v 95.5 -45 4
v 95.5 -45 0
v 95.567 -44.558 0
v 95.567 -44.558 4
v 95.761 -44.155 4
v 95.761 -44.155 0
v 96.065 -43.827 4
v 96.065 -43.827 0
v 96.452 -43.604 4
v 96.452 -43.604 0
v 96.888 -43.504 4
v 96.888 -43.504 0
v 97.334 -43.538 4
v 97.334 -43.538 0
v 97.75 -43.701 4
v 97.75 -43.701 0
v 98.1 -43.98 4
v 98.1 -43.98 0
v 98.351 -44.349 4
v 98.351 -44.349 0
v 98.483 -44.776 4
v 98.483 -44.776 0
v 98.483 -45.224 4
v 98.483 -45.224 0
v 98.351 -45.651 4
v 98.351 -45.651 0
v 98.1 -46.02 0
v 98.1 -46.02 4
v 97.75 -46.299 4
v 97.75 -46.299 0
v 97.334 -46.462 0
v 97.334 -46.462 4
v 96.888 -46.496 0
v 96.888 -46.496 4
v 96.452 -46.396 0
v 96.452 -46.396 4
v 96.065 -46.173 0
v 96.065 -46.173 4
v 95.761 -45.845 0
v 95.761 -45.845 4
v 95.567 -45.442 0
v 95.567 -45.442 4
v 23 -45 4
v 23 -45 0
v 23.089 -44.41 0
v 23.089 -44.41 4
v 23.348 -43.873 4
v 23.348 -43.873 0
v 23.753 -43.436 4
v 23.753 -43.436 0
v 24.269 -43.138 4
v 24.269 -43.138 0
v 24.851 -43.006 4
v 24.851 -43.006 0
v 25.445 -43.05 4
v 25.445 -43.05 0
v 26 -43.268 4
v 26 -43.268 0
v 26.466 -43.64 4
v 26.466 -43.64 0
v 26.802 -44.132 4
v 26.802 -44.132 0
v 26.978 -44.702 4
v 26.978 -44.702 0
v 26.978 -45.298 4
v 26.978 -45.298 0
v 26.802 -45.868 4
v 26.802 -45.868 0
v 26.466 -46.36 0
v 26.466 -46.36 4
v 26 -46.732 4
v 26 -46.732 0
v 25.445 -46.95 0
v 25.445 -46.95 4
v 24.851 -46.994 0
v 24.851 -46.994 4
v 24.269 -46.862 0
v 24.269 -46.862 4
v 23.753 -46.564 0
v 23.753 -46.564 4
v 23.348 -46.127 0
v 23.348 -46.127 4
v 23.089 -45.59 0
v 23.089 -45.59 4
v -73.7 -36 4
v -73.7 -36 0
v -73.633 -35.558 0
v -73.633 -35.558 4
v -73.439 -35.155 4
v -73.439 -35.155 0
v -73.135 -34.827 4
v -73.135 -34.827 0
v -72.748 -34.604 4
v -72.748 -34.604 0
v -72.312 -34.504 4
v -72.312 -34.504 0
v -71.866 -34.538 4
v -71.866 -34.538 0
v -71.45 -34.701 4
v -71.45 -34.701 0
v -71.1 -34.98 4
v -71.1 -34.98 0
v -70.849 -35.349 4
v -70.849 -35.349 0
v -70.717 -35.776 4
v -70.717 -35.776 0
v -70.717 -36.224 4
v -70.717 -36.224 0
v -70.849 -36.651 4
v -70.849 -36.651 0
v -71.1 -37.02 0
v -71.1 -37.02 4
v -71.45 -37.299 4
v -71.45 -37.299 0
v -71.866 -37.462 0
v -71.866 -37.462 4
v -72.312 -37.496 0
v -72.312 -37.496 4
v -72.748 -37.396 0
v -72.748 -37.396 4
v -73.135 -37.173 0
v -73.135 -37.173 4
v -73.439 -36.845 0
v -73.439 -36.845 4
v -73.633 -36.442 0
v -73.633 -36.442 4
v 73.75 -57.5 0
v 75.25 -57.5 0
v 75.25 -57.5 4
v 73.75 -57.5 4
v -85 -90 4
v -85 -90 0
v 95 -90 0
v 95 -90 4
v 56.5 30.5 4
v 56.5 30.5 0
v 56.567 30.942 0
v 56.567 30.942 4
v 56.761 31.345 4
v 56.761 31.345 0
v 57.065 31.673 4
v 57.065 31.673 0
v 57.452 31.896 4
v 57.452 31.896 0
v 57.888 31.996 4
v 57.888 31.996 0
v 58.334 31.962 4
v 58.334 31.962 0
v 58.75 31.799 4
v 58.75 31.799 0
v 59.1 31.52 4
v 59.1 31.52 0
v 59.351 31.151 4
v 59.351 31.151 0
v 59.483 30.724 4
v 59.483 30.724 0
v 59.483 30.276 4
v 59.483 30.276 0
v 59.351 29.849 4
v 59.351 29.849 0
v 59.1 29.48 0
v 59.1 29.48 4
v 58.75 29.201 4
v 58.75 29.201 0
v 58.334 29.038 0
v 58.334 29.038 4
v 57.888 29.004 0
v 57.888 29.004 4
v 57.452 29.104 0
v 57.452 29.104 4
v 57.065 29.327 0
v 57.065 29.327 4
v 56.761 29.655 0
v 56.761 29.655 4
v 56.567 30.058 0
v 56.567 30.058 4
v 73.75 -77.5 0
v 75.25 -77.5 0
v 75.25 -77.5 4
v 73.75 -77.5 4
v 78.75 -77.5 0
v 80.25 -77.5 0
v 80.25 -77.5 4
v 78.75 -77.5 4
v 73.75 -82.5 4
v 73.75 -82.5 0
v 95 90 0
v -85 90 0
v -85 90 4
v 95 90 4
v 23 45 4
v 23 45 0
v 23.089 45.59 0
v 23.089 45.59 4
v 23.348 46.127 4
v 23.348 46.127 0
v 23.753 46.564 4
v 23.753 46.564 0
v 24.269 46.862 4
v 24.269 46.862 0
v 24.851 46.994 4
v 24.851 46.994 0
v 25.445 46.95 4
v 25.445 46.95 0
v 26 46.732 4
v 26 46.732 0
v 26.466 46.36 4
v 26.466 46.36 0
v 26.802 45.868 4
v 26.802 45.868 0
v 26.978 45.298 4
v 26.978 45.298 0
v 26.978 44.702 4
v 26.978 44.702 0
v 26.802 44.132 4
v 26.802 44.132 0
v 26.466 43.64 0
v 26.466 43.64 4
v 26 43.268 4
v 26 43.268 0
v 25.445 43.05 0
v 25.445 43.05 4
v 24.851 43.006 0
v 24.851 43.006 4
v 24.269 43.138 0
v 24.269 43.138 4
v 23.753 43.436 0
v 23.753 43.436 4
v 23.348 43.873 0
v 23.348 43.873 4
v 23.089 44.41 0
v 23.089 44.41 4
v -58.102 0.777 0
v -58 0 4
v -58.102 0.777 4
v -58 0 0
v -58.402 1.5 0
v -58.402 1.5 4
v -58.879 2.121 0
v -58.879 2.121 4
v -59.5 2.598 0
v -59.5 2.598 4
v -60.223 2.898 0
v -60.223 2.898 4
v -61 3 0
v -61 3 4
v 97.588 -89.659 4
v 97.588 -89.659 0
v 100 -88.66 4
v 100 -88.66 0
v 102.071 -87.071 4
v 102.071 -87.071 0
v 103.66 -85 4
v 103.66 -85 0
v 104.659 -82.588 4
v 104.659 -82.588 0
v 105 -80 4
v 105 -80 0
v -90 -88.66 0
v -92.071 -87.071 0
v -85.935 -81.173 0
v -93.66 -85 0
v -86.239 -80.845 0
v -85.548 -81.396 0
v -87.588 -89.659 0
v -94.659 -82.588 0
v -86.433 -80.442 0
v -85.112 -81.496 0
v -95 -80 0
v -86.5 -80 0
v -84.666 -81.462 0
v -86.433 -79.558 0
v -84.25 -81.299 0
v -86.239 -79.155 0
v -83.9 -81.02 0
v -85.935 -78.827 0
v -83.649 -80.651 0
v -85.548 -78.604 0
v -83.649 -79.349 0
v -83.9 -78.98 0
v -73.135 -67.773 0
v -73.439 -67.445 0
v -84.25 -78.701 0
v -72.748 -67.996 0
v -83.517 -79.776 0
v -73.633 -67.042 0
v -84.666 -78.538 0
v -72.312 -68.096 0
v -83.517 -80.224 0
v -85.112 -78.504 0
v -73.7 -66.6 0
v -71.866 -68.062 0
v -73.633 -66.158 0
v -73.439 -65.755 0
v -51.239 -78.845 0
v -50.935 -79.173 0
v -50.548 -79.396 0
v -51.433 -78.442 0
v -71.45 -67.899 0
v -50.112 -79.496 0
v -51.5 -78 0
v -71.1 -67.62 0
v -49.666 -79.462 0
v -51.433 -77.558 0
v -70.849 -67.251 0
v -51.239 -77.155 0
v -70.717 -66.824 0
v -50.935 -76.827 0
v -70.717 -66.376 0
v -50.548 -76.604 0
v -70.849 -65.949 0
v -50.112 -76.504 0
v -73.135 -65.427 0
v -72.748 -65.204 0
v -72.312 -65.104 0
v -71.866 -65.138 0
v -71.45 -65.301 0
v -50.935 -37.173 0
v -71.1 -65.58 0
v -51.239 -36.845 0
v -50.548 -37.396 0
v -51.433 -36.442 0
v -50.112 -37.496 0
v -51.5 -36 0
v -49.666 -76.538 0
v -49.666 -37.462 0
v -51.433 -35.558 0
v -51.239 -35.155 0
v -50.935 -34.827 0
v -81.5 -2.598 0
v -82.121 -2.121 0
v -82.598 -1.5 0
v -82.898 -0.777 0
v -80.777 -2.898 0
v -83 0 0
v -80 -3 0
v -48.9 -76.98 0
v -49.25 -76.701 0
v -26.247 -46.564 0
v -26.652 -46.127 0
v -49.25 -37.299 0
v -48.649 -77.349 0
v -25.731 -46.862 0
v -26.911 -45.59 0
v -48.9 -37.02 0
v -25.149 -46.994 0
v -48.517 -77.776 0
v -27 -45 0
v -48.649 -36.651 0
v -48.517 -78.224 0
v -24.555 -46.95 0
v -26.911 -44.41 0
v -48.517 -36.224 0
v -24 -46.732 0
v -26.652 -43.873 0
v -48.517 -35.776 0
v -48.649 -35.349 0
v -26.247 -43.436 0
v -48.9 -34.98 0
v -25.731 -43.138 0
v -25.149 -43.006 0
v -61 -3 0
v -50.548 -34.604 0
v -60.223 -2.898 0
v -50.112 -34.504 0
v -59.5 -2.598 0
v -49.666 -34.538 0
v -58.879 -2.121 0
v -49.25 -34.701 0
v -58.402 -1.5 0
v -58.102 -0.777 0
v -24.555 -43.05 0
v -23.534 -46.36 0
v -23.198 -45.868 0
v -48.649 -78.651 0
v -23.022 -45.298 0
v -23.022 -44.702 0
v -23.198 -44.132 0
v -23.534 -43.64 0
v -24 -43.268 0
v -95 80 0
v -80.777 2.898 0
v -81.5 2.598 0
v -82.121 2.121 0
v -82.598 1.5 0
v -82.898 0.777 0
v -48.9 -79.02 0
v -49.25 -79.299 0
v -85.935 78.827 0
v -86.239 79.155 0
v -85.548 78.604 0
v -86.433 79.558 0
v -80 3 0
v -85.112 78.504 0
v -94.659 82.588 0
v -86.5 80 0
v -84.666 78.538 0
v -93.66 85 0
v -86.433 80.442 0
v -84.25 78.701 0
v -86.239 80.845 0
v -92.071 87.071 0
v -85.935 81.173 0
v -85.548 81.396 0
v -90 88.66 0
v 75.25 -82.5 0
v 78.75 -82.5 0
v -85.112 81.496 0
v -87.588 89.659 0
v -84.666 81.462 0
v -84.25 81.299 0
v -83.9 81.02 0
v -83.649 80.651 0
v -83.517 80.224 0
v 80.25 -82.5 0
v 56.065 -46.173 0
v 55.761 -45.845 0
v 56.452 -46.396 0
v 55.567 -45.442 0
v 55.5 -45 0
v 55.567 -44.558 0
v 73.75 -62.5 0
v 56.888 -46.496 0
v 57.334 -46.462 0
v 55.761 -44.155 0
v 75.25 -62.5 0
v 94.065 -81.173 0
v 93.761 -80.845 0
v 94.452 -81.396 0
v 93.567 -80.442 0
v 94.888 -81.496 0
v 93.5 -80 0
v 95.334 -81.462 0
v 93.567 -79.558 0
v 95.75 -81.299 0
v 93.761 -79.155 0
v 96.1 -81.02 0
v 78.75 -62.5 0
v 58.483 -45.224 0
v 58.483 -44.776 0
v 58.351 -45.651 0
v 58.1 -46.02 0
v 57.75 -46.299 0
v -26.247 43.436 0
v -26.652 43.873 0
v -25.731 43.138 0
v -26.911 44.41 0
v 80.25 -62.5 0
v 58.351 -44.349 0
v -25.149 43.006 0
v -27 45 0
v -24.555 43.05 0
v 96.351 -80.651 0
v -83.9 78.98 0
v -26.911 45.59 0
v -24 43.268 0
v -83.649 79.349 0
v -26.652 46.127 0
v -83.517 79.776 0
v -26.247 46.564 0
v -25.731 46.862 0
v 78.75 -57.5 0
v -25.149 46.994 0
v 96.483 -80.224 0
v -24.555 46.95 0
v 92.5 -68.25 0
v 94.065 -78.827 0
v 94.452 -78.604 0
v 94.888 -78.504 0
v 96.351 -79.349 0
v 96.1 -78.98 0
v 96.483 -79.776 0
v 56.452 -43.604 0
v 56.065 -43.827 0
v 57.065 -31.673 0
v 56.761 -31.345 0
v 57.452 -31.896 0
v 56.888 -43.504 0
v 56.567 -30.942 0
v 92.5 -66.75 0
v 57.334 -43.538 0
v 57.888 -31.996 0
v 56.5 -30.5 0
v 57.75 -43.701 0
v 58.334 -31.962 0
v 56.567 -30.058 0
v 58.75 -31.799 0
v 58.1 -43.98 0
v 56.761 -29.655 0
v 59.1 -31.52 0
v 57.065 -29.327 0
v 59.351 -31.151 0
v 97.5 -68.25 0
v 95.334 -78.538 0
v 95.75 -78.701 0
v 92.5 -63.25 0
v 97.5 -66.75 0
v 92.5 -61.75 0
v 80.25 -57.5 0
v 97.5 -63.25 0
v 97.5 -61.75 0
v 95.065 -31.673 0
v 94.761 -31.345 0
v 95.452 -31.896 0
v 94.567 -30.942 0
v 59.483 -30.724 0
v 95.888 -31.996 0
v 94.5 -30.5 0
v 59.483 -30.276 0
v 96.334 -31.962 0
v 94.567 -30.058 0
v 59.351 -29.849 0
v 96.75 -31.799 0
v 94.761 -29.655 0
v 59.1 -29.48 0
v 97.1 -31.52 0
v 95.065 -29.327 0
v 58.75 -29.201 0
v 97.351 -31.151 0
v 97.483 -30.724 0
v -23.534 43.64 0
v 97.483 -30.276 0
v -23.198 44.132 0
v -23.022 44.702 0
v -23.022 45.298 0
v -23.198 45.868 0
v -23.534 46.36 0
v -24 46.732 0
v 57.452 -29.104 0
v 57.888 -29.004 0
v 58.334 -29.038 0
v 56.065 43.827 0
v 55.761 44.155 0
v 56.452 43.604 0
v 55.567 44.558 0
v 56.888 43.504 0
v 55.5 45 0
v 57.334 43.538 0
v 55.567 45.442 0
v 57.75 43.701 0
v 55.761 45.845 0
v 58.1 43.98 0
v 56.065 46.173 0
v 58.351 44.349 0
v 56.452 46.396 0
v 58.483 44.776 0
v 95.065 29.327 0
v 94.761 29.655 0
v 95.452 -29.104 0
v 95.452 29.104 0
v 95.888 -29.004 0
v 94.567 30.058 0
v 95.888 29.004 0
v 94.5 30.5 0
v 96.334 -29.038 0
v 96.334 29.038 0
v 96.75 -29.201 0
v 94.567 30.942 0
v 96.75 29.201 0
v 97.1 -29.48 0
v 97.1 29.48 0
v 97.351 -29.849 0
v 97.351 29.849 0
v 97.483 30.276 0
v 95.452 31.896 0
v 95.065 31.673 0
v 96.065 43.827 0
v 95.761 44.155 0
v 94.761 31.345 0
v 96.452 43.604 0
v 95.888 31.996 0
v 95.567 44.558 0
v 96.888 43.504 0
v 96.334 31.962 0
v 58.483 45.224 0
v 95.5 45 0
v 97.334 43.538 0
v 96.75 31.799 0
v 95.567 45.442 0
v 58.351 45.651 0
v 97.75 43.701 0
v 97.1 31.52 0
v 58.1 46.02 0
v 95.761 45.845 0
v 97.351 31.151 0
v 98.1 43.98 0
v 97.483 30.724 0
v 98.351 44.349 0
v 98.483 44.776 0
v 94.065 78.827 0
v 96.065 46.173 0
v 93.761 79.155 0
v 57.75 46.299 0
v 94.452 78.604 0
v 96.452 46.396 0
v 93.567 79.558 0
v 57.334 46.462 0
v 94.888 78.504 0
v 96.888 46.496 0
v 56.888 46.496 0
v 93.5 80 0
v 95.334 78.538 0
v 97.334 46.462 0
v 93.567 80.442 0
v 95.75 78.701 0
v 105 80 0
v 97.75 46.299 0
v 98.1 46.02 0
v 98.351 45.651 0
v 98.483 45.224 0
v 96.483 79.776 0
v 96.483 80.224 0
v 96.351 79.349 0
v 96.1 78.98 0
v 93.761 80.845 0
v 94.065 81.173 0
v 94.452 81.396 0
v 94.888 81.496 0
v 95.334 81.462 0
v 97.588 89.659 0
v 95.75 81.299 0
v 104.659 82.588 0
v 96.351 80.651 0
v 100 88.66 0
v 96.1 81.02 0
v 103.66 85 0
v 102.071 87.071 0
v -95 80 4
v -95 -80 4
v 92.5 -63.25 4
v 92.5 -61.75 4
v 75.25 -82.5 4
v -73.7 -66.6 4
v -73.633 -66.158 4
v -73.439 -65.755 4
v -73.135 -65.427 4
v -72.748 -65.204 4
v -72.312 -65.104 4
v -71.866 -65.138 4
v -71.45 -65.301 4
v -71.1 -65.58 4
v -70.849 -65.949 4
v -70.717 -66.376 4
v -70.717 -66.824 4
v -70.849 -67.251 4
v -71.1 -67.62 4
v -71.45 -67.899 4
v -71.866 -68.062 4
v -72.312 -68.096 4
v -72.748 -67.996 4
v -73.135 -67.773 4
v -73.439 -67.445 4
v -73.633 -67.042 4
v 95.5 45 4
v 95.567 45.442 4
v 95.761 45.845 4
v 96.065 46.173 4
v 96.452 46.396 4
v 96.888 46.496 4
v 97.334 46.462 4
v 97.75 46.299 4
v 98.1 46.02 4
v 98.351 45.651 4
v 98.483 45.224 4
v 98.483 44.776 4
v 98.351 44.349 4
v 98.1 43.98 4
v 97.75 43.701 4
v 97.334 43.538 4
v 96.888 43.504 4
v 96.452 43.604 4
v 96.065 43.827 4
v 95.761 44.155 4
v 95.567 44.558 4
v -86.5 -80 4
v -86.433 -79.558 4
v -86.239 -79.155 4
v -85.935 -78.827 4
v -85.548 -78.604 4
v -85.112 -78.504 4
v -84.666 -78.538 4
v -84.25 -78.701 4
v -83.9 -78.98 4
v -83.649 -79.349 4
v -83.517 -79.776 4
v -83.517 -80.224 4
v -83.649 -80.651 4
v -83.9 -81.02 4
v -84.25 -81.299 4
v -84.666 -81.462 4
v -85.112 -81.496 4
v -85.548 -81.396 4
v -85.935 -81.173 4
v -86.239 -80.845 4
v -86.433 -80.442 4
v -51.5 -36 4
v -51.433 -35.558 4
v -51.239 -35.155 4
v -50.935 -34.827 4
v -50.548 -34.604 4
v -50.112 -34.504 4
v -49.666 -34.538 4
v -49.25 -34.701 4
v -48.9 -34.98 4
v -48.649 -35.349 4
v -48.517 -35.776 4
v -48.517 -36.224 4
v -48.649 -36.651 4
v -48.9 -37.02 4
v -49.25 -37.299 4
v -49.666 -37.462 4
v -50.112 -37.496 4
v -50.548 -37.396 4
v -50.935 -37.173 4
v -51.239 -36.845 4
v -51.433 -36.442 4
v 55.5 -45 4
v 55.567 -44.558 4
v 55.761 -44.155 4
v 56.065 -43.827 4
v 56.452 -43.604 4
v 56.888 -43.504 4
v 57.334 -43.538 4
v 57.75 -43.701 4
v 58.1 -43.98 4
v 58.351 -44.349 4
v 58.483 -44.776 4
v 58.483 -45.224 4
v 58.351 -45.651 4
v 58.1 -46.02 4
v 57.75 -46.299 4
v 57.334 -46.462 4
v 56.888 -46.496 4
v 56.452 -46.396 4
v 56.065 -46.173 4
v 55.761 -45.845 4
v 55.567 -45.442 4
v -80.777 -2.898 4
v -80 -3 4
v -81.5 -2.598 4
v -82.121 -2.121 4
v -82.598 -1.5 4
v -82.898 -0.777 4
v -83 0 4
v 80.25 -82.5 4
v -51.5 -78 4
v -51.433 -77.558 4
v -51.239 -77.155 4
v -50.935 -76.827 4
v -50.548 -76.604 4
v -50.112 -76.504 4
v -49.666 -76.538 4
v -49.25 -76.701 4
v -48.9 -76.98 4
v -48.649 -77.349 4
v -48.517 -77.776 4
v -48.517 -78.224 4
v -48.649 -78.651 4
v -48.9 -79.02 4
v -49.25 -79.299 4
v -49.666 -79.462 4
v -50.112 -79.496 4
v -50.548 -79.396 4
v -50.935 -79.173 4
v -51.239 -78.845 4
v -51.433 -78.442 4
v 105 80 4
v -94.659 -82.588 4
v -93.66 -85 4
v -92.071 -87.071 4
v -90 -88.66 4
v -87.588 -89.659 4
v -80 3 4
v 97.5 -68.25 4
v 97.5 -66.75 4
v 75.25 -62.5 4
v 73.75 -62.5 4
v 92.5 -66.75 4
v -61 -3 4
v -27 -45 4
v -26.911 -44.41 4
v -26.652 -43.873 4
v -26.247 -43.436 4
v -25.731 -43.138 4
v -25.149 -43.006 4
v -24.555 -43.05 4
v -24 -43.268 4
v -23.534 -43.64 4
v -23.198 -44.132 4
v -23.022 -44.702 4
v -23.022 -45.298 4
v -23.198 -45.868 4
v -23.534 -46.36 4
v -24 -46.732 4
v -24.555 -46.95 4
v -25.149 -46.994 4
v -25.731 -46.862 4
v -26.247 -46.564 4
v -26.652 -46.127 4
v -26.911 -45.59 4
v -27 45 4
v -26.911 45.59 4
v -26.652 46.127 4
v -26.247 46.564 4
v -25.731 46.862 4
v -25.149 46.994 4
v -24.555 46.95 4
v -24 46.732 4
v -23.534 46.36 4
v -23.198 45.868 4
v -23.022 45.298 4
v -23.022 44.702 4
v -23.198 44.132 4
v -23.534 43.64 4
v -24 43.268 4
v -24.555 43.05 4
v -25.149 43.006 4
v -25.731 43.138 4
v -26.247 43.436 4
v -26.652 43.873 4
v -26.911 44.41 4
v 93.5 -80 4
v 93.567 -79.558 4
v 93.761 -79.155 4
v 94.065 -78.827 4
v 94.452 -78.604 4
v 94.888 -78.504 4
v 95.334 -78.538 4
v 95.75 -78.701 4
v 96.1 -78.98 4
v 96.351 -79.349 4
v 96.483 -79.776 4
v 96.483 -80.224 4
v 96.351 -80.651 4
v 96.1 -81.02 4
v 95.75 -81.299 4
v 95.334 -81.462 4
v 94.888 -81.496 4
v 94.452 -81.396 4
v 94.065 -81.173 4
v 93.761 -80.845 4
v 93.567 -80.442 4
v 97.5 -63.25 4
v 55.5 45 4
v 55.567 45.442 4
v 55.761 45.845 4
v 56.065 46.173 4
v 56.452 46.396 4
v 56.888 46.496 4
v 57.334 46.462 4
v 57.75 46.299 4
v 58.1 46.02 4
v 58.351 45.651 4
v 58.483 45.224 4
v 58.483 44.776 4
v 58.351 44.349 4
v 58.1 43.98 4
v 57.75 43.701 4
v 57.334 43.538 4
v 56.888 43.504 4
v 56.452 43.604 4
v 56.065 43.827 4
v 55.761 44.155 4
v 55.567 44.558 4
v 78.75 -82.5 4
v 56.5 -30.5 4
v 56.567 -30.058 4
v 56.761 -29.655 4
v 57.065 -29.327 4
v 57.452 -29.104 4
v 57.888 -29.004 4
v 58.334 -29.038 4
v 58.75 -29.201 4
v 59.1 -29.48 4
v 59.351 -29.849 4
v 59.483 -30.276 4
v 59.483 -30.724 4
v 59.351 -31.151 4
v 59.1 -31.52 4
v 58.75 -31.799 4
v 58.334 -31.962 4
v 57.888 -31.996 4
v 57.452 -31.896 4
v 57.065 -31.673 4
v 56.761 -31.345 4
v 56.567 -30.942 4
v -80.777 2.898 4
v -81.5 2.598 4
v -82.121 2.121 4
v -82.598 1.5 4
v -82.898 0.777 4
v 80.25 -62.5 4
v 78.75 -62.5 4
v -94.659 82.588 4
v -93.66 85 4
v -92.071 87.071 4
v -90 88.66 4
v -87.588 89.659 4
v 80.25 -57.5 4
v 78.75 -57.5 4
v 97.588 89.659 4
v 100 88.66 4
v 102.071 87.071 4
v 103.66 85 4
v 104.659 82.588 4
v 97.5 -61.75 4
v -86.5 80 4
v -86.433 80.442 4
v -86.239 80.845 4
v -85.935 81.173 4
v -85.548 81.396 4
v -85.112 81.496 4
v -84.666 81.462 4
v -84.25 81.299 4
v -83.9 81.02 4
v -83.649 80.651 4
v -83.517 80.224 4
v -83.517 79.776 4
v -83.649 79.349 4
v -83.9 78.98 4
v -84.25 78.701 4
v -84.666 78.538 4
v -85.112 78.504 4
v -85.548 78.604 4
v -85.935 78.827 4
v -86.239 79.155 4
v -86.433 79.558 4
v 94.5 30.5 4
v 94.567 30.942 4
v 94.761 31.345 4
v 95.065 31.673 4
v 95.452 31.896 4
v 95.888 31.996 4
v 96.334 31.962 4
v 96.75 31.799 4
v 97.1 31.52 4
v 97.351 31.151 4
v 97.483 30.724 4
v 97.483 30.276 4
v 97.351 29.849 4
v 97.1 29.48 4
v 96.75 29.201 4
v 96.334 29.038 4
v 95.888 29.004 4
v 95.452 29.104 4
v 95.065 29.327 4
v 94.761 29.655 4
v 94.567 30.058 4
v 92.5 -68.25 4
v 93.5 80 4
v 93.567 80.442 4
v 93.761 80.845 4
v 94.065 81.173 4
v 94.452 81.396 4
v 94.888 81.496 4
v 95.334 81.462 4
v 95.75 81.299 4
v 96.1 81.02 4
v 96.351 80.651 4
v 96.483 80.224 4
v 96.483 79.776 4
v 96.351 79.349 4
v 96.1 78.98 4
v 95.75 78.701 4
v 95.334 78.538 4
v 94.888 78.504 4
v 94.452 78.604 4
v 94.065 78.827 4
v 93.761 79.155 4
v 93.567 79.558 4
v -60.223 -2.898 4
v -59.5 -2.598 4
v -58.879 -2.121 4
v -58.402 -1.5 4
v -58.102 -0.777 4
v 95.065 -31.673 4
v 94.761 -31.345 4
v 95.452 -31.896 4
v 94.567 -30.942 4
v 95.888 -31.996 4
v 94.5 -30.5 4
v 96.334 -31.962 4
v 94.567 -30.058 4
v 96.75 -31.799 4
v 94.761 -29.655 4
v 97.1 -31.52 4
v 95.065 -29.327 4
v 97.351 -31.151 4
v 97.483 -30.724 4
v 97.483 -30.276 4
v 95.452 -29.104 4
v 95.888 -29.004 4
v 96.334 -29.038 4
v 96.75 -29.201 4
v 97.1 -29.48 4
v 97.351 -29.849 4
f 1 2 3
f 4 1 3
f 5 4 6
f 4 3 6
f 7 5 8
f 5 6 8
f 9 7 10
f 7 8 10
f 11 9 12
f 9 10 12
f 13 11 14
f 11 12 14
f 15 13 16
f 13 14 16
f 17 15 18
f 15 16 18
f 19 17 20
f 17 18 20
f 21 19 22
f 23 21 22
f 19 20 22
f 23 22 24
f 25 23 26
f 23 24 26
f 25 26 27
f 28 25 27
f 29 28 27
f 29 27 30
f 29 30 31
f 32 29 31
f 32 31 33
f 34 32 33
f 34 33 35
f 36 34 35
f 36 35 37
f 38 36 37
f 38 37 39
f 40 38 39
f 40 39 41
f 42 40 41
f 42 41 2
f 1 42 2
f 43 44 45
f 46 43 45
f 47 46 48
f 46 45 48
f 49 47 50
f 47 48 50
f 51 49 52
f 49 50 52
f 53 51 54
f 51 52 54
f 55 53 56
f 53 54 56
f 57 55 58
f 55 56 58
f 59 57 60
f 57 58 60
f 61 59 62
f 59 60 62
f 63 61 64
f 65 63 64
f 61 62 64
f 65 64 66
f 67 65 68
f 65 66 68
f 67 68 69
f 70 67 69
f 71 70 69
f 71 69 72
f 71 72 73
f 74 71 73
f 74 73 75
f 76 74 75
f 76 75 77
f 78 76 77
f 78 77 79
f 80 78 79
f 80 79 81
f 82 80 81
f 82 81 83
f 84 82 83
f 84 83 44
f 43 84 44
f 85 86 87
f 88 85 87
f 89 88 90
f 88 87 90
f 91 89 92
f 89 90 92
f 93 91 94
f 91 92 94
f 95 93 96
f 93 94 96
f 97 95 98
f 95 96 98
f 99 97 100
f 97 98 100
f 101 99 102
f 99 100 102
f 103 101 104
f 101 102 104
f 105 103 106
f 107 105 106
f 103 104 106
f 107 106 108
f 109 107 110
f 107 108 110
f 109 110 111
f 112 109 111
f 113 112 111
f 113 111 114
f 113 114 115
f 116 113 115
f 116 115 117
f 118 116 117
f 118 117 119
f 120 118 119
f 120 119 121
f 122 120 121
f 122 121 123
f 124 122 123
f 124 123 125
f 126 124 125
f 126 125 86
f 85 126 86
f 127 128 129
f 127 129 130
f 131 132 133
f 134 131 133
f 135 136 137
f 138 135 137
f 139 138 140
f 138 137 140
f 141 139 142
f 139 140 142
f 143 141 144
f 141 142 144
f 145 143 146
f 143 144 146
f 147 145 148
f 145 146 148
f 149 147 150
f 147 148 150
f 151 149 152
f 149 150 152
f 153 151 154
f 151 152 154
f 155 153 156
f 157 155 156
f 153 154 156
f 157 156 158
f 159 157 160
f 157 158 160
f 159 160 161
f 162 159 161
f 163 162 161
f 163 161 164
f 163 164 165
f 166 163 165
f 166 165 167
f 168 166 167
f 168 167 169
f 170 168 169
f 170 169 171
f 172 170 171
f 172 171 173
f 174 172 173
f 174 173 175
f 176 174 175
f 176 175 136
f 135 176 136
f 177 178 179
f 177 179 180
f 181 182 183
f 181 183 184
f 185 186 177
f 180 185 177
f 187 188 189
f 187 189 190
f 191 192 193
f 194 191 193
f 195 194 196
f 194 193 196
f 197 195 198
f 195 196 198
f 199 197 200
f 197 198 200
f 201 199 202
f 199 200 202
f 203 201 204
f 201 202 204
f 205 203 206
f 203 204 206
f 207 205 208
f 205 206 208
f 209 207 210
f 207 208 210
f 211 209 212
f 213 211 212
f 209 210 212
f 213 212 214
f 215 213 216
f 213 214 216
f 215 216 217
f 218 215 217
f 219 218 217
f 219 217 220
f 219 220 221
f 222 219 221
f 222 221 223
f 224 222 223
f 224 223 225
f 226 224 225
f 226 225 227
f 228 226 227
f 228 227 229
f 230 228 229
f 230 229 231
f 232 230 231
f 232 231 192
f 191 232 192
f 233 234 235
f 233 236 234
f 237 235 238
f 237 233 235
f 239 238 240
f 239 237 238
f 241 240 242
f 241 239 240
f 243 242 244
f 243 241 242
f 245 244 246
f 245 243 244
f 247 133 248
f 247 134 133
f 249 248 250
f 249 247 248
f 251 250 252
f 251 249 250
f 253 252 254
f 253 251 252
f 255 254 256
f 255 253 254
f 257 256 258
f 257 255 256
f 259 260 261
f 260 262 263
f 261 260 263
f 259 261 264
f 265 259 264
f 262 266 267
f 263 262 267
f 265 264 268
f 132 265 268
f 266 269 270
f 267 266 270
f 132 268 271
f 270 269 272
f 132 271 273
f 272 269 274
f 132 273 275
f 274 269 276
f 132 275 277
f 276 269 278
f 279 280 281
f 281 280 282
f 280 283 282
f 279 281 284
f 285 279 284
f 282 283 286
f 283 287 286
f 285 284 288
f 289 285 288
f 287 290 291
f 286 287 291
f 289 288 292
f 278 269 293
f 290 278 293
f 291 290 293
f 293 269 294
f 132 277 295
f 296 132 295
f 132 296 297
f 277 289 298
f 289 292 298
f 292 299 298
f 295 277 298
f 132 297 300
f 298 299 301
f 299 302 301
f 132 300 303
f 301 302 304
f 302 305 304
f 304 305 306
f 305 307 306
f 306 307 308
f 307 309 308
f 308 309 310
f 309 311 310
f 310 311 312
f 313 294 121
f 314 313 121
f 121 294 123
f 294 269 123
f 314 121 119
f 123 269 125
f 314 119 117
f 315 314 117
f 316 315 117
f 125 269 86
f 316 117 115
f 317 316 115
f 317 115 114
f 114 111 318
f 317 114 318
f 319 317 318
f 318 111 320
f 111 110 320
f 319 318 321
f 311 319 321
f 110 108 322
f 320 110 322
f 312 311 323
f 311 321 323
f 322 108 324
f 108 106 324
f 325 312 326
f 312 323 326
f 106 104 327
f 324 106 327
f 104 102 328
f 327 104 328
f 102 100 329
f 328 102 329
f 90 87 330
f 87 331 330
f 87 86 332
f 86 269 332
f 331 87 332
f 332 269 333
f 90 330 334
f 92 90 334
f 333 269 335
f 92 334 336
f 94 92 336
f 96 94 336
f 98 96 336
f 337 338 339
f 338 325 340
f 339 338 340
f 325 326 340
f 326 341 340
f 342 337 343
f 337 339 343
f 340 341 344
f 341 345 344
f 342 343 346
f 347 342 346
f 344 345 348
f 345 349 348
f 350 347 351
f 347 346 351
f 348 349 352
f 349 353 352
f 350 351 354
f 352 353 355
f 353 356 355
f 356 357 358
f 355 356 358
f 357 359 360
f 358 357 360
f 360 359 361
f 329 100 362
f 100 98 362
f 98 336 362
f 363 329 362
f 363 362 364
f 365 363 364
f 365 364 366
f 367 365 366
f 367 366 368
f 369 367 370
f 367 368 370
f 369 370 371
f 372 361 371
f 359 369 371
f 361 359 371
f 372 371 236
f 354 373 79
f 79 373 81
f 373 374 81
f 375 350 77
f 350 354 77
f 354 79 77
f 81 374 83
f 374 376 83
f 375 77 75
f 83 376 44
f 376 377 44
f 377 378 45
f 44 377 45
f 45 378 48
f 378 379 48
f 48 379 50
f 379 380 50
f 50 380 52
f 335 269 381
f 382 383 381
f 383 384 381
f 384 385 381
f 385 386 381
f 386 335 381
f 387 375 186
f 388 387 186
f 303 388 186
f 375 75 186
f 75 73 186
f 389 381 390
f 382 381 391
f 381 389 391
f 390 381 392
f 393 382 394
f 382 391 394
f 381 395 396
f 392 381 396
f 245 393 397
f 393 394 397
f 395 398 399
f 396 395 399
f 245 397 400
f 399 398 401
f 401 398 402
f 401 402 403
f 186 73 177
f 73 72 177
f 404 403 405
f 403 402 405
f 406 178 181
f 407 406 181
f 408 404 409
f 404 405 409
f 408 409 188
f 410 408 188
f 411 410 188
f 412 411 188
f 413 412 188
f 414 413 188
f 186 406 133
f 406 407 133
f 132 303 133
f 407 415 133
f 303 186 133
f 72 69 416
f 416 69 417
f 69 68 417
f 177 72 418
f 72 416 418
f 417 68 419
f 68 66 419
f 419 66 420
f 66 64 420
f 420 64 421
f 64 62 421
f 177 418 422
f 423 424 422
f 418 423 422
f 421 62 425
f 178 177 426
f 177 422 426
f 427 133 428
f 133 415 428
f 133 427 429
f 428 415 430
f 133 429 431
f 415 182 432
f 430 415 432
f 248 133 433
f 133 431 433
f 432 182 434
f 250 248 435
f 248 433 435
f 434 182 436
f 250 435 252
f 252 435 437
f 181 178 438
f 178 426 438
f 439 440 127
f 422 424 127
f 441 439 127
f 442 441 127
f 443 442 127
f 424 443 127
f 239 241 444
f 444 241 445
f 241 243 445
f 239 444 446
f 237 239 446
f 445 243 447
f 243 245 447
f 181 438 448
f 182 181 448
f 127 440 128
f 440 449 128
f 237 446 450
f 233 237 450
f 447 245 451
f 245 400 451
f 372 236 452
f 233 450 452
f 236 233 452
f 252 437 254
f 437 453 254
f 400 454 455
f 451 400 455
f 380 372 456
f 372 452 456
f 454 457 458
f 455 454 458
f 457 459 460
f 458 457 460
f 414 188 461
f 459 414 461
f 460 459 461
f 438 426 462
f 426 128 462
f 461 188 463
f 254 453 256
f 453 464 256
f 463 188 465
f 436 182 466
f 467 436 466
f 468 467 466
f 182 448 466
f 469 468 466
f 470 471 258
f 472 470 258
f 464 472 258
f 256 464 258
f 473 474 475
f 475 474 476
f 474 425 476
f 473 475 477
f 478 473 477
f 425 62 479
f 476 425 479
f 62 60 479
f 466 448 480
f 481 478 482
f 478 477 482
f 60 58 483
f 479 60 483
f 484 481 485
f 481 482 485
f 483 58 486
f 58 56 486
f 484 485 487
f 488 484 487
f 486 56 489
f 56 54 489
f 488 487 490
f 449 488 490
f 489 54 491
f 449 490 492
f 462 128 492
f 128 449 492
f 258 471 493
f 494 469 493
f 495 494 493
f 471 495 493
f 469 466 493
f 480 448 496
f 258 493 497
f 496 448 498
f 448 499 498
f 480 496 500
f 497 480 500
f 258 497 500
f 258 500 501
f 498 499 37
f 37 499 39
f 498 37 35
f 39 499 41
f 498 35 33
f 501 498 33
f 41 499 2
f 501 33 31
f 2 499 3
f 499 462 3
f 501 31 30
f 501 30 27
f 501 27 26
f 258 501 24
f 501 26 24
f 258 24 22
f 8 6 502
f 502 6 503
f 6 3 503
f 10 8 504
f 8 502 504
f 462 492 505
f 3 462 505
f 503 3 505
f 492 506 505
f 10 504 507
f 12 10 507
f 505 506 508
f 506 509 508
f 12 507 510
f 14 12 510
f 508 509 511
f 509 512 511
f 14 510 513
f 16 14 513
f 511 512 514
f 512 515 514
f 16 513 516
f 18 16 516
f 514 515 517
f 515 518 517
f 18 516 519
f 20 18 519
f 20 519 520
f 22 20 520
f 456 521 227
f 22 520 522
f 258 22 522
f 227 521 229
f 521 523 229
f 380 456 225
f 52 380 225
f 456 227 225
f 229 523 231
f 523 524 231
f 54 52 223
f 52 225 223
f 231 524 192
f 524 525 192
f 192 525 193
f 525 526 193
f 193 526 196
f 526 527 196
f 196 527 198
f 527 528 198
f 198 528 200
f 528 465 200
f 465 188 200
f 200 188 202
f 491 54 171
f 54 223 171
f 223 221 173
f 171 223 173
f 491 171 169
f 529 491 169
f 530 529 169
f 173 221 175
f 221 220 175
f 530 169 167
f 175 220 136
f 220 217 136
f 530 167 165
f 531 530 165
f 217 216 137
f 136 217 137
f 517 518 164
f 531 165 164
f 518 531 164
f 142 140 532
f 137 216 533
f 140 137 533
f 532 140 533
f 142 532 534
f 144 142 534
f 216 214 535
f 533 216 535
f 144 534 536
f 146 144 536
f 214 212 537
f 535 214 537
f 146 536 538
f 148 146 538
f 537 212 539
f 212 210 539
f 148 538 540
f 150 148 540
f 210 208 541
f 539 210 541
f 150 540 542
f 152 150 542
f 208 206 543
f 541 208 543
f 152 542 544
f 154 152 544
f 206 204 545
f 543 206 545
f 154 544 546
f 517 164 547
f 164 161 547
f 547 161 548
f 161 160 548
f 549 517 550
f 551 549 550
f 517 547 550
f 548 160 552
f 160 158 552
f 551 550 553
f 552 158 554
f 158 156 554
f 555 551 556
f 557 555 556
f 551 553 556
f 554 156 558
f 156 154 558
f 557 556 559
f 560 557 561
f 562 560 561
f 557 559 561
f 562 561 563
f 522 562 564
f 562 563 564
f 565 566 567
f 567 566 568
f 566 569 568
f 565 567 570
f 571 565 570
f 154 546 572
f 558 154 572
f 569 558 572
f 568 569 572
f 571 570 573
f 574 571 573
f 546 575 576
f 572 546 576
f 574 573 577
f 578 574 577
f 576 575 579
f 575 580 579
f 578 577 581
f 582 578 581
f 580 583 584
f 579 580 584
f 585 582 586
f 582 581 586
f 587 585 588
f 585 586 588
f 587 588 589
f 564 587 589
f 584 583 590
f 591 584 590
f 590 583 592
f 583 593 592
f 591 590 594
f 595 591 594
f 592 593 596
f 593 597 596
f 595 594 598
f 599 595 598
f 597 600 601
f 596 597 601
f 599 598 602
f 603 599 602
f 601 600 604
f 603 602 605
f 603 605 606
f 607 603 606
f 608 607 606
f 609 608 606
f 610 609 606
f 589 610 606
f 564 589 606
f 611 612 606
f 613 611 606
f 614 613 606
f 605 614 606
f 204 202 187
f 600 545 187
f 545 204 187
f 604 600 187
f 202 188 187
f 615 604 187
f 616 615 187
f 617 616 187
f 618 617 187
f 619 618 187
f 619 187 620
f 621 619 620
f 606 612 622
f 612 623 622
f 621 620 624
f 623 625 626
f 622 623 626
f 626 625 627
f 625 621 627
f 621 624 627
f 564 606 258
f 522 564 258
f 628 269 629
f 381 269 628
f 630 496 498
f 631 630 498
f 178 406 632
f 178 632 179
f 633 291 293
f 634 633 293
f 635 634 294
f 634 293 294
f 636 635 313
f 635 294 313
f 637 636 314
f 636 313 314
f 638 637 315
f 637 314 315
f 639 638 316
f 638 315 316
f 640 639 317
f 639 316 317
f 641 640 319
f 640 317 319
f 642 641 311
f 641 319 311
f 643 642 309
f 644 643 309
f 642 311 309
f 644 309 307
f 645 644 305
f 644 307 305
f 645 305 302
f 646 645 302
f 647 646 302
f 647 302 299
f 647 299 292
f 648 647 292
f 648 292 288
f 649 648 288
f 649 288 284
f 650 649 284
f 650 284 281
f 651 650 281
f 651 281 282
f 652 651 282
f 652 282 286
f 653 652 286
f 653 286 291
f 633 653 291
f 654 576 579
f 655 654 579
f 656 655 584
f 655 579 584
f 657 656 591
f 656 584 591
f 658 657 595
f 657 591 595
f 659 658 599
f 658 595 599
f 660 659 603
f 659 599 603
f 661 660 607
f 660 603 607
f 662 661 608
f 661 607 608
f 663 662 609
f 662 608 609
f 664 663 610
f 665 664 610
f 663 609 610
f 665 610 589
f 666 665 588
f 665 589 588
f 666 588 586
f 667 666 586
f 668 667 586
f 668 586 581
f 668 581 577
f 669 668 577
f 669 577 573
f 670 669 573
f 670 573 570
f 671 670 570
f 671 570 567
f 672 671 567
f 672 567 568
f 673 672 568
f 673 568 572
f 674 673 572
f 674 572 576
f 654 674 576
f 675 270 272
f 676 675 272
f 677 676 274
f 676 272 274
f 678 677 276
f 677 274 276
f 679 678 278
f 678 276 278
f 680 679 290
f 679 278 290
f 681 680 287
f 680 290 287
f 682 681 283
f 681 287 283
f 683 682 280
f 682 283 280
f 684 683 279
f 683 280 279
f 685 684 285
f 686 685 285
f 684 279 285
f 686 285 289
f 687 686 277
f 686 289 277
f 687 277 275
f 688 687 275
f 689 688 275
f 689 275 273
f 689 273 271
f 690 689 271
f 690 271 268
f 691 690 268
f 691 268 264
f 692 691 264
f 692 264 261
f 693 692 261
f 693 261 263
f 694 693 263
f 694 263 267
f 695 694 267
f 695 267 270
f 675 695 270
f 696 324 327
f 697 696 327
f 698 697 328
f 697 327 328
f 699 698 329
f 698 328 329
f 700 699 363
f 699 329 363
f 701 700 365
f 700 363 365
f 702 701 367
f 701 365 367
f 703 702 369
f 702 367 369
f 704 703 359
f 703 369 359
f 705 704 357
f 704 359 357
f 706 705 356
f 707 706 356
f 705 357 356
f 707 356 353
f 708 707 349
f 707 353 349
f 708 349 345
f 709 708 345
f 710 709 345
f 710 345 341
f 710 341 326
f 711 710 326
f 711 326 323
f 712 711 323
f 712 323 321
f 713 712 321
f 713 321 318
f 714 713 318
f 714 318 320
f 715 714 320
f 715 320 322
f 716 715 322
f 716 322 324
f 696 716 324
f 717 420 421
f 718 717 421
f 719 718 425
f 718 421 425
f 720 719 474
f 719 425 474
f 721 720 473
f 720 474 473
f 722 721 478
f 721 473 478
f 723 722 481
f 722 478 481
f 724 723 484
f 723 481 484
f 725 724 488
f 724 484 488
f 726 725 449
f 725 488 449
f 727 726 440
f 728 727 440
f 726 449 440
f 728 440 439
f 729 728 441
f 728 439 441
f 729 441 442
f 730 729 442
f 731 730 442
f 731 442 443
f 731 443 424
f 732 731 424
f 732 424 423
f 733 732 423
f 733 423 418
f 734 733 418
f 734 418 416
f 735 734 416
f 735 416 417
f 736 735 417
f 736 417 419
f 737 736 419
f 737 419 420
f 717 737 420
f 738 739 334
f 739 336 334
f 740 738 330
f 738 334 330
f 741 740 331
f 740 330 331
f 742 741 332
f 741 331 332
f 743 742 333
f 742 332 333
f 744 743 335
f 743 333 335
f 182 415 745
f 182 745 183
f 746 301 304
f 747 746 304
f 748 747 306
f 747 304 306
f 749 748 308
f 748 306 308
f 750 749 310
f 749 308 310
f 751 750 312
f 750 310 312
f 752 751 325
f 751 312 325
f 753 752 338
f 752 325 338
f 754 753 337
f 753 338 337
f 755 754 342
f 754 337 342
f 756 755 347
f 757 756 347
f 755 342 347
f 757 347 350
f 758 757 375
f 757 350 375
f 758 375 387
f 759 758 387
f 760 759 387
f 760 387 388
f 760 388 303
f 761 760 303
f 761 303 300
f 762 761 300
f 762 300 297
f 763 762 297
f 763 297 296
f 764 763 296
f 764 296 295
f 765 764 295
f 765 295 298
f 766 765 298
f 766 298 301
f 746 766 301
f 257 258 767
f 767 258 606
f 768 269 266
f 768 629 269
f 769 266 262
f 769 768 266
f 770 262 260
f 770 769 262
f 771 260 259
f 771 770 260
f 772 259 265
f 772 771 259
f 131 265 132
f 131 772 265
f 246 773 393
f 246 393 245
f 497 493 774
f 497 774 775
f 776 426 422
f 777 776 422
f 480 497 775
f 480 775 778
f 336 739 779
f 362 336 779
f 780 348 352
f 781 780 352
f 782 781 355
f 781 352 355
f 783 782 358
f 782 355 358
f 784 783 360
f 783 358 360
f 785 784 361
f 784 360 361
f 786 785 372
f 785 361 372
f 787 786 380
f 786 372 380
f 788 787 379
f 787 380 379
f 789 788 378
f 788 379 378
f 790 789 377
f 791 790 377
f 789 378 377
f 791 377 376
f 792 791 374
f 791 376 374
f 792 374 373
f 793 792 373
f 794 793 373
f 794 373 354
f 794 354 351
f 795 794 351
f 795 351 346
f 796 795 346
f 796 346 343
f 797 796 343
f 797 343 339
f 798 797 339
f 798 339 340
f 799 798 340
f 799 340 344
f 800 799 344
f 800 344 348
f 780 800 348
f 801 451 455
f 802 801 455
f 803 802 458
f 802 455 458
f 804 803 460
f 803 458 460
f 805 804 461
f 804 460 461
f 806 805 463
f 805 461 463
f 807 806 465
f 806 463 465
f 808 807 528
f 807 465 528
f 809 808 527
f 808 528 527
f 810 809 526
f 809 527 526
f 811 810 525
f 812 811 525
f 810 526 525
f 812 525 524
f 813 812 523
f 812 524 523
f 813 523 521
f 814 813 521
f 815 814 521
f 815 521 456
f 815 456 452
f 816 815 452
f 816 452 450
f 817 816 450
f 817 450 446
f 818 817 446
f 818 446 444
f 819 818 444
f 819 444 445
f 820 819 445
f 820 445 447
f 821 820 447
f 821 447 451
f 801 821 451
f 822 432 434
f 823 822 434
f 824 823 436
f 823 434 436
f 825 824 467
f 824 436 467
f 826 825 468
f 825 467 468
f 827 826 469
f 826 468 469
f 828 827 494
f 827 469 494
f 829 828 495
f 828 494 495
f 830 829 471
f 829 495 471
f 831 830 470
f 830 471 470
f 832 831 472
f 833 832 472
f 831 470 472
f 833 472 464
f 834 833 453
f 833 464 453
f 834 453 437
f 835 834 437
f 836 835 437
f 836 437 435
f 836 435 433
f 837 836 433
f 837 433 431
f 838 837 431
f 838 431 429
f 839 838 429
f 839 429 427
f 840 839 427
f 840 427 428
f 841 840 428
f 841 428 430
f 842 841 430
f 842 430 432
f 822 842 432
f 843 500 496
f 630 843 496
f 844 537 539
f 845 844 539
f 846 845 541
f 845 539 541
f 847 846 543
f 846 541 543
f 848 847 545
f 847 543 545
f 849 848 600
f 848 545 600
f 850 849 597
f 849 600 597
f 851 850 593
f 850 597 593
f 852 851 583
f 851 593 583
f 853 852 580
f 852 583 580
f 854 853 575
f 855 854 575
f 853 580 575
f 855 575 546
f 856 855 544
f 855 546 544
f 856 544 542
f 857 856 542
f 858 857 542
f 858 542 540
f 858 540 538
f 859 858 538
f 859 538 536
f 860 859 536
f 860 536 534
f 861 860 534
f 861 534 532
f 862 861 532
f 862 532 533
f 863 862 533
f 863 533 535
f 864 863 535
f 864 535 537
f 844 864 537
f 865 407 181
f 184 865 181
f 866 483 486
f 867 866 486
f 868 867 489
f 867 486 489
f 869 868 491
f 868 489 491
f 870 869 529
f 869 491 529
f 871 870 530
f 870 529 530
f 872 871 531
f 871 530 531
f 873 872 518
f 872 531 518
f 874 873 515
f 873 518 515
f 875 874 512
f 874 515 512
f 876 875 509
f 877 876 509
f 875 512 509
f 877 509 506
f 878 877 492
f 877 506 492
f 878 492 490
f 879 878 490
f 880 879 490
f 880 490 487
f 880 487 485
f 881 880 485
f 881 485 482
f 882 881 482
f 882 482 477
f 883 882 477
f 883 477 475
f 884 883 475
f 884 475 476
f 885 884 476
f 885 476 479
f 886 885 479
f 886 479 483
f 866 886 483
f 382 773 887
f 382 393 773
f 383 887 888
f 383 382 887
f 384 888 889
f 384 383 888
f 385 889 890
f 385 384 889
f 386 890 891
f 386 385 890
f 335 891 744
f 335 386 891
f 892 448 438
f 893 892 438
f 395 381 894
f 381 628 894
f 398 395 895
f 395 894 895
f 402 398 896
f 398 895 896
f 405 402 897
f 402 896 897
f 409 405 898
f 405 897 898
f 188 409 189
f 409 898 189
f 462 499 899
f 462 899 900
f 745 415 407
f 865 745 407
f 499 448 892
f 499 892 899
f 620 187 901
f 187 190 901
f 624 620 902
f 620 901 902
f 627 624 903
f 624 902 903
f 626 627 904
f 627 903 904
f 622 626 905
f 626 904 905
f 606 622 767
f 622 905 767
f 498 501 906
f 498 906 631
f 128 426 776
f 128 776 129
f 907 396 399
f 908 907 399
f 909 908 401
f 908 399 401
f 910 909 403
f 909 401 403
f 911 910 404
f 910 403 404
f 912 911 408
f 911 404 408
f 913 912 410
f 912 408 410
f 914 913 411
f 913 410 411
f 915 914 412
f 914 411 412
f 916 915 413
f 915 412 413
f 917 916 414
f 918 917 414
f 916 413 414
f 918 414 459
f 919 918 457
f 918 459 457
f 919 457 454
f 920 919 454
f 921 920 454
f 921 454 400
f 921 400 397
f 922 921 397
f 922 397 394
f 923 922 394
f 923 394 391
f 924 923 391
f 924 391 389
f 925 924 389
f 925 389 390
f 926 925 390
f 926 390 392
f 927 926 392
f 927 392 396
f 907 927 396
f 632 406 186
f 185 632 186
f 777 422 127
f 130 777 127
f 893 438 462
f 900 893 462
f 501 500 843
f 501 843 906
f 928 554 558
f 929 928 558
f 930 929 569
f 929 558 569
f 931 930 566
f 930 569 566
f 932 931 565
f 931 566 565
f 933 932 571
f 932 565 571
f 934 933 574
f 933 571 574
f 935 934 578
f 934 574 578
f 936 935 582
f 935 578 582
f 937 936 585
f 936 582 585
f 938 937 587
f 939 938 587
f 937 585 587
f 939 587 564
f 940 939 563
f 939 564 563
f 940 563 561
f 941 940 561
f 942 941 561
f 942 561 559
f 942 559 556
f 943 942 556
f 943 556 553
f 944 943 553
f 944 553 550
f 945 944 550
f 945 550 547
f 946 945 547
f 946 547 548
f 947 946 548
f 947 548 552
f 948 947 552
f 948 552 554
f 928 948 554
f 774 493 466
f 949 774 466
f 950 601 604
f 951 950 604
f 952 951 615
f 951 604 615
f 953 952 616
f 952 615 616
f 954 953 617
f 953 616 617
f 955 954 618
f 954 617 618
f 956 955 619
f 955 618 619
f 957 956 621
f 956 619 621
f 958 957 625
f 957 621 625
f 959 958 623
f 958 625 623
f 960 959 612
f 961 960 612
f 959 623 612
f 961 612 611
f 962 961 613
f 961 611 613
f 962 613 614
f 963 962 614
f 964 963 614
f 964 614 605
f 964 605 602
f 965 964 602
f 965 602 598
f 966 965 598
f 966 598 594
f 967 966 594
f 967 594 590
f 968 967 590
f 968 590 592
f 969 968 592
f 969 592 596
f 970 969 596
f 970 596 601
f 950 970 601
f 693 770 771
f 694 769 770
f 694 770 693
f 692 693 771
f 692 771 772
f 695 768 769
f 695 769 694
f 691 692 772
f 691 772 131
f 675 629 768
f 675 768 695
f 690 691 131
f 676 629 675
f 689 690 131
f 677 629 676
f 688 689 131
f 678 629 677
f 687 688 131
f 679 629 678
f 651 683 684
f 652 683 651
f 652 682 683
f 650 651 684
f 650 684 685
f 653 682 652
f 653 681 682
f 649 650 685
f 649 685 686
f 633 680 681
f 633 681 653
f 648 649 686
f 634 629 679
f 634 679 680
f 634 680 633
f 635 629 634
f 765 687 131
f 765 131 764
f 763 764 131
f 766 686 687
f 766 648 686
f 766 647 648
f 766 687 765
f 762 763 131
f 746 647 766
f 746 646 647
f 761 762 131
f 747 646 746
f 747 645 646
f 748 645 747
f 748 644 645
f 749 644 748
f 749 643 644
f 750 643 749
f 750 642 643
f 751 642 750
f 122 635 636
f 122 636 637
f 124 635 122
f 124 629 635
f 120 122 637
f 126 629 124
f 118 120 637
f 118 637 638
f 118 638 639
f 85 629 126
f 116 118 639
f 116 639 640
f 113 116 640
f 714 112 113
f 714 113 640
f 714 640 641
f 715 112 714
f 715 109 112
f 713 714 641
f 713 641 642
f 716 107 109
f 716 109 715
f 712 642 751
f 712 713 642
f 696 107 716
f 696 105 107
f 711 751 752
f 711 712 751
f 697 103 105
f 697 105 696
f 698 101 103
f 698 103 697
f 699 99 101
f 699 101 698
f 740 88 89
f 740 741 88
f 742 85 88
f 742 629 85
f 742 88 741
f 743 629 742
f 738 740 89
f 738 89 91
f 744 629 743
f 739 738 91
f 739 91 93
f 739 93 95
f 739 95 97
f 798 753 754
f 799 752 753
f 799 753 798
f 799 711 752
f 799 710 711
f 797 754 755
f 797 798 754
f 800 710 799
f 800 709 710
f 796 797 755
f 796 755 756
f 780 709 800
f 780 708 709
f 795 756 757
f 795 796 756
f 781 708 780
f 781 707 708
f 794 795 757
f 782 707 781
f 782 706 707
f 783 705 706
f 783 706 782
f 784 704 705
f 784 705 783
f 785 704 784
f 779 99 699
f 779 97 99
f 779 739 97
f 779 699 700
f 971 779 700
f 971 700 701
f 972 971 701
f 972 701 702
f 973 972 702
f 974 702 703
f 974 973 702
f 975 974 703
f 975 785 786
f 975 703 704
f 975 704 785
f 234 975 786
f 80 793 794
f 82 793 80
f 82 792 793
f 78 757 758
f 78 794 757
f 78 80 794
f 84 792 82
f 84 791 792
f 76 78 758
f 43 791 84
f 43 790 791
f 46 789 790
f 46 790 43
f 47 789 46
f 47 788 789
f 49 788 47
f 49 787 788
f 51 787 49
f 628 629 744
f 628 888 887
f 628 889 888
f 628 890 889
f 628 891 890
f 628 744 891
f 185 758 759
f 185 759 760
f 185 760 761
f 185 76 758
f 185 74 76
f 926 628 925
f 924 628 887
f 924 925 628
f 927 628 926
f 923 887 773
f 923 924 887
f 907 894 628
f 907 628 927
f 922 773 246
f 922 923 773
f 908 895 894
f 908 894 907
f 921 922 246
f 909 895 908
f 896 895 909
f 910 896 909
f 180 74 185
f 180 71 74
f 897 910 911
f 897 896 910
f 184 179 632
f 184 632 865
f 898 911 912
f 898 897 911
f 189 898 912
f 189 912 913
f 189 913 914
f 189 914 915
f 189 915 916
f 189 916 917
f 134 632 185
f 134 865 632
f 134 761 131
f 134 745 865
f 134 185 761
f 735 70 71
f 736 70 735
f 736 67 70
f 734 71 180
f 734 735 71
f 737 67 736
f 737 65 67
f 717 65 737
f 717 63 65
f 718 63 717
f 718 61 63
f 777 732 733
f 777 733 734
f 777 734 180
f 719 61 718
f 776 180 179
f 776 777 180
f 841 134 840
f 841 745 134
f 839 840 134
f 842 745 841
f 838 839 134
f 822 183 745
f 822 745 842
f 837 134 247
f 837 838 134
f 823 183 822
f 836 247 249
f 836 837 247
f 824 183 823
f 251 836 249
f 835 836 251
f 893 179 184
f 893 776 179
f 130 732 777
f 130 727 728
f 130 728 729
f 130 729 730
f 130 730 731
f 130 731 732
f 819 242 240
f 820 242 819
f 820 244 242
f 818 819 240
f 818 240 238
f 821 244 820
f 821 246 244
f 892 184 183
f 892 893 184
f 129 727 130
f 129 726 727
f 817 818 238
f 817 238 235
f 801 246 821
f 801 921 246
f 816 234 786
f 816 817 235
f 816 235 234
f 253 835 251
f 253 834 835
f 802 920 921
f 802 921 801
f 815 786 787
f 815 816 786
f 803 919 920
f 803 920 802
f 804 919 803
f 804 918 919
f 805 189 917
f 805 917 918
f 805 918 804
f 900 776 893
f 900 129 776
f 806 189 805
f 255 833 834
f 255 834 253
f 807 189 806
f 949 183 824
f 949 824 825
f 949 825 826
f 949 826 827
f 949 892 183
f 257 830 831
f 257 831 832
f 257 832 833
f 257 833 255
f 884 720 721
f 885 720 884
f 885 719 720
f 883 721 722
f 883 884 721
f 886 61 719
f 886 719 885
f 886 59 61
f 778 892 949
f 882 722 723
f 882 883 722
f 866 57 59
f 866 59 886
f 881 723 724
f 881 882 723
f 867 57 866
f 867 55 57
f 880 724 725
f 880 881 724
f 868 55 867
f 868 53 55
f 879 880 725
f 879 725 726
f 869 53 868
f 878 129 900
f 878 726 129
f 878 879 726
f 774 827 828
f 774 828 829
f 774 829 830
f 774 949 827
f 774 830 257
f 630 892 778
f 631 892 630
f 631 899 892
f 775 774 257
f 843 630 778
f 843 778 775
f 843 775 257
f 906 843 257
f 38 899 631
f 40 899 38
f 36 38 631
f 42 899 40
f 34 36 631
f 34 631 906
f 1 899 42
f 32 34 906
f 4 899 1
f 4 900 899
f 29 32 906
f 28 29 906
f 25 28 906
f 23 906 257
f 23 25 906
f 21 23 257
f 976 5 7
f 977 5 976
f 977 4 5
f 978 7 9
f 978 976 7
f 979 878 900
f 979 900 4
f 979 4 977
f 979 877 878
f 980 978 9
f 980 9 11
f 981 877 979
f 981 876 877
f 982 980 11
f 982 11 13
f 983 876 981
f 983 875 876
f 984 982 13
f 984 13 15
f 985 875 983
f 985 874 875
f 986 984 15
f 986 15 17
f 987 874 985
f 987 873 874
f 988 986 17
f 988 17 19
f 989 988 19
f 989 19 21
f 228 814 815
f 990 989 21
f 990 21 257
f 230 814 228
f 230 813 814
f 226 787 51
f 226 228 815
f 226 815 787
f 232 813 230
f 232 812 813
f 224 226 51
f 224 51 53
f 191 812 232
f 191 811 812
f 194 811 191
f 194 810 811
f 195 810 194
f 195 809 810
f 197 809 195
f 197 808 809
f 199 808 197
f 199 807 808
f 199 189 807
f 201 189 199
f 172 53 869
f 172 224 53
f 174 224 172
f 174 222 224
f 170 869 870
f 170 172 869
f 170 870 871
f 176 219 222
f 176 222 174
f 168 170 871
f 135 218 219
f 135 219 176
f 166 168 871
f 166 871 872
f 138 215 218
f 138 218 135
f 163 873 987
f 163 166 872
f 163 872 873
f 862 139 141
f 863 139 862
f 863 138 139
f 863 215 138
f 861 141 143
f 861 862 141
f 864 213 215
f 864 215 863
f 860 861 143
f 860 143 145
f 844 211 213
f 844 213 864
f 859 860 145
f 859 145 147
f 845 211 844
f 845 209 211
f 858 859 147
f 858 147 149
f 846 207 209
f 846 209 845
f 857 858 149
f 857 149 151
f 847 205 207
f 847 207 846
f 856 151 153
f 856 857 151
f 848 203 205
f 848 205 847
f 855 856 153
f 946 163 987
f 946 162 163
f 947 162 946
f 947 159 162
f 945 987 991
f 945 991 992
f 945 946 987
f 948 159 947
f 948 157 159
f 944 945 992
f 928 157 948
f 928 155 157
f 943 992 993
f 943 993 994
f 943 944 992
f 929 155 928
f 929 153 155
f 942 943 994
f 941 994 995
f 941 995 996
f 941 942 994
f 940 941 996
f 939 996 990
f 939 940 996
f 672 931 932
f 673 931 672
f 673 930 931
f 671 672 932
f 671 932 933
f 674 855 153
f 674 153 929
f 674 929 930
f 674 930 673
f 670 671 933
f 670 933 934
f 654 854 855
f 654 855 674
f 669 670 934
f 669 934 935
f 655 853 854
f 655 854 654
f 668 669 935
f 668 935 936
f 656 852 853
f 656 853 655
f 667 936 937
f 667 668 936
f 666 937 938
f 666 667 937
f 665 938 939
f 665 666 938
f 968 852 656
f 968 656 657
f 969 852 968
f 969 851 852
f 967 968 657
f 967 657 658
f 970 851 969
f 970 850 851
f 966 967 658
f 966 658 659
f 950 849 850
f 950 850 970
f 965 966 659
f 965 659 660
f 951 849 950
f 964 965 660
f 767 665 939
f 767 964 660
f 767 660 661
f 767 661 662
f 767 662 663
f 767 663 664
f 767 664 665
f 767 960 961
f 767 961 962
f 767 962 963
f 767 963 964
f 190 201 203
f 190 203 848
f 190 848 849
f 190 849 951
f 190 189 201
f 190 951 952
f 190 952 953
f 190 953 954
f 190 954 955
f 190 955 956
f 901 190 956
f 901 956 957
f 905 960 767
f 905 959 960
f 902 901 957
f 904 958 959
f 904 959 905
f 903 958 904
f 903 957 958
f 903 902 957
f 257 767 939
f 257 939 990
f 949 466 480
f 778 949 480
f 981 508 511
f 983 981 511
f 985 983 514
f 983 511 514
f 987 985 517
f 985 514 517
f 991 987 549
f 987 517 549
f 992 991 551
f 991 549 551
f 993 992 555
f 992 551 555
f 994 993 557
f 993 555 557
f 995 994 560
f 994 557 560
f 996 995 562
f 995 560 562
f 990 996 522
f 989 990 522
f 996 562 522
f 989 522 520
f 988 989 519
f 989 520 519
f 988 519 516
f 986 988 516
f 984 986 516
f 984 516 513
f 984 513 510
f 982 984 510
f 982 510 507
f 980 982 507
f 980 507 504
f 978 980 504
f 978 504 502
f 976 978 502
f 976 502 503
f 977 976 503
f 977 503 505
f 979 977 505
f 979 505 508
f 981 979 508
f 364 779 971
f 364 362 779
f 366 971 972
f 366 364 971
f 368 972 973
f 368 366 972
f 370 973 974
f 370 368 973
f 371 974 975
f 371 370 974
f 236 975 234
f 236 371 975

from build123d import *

# Parameters (mm, degrees)
SKETCH1_W           = 200.000000134
SKETCH1_H           = 180
BOSS_EXTRUDE1_DEPTH = 4
SKETCH2_R           = 2
CUT_EXTRUDE1_DEPTH  = 139.351002938
FILLET1_R           = 10
SKETCH4_R           = 1.5
CUT_EXTRUDE3_DEPTH  = 20
SKETCH5_R           = 1.5
CUT_EXTRUDE4_DEPTH  = 139.351002938
SKETCH6_W           = 1.5
SKETCH6_H           = 5
SKETCH6_W_2         = 5
SKETCH6_H_2         = 1.5
CUT_EXTRUDE5_DEPTH  = 139.351002938
SKETCH7_R           = 1.5
CUT_EXTRUDE6_DEPTH  = 139.351002938
SKETCH8_R           = 1.5
CUT_EXTRUDE7_DEPTH  = 139.351002938
SKETCH9_W           = 25
SKETCH9_H           = 6
CUT_EXTRUDE8_DEPTH  = 10
FILLET2_R           = 3


with BuildPart() as part:
    # Sketch1 → Boss-Extrude1 (new body)
    with BuildSketch(Plane.XY):
        with Locations((5, 0)):
            Rectangle(SKETCH1_W, SKETCH1_H)
    extrude(amount=BOSS_EXTRUDE1_DEPTH)

    # Sketch2 → Cut-Extrude1 (cut, through all)
    with BuildSketch(Plane(origin=(0, 0, 0), x_dir=(-1, 0, 0), z_dir=(0, 0, -1))):
        with Locations((25, 45)):
            Circle(SKETCH2_R)
        with Locations((-25, 45)):
            Circle(SKETCH2_R)
        with Locations((-25, -45)):
            Circle(SKETCH2_R)
        with Locations((25, -45)):
            Circle(SKETCH2_R)
    extrude(amount=-CUT_EXTRUDE1_DEPTH, mode=Mode.SUBTRACT)

    # Fillet1
    fillet1_edges = [part.edges().sort_by_distance(p)[0] for p in [
        (-95.000000067, 90, 2),
        (105.000000067, 90, 2),
        (105.000000067, -90, 2),
        (-95.000000067, -90, 2),
    ]]
    fillet(fillet1_edges, radius=FILLET1_R)

    # Sketch4 → Cut-Extrude3 (cut)
    with BuildSketch(Plane(origin=(0, 0, 0), x_dir=(-1, 0, 0), z_dir=(0, 0, -1))):
        with Locations((-96.000000067, 30.5)):
            Circle(SKETCH4_R)
        with Locations((-58.000000067, 30.5)):
            Circle(SKETCH4_R)
        with Locations((-96.000000067, -30.5)):
            Circle(SKETCH4_R)
        with Locations((-58.000000067, -30.5)):
            Circle(SKETCH4_R)
    extrude(amount=-CUT_EXTRUDE3_DEPTH, mode=Mode.SUBTRACT)

    # Sketch5 → Cut-Extrude4 (cut, through all)
    with BuildSketch(Plane(origin=(0, 0, 0), x_dir=(-1, 0, 0), z_dir=(0, 0, -1))):
        with Locations((-57.000000067, 45)):
            Circle(SKETCH5_R)
        with Locations((-97.000000067, 45)):
            Circle(SKETCH5_R)
        with Locations((-97.000000067, -45)):
            Circle(SKETCH5_R)
        with Locations((-57.000000067, -45)):
            Circle(SKETCH5_R)
    extrude(amount=-CUT_EXTRUDE4_DEPTH, mode=Mode.SUBTRACT)

    # Sketch6 → Cut-Extrude5 (cut, through all)
    with BuildSketch(Plane(origin=(0, 0, 0), x_dir=(-1, 0, 0), z_dir=(0, 0, -1))):
        with Locations((-74.500000067, -60)):
            Rectangle(SKETCH6_W, SKETCH6_H)
        with Locations((-79.500000067, -60)):
            Rectangle(SKETCH6_W, SKETCH6_H)
        with Locations((-74.500000067, -80)):
            Rectangle(SKETCH6_W, SKETCH6_H)
        with Locations((-79.500000067, -80)):
            Rectangle(SKETCH6_W, SKETCH6_H)
        with Locations((-95.000000067, -67.5)):
            Rectangle(SKETCH6_W_2, SKETCH6_H_2)
        with Locations((-95.000000067, -62.5)):
            Rectangle(SKETCH6_W_2, SKETCH6_H_2)
    extrude(amount=-CUT_EXTRUDE5_DEPTH, mode=Mode.SUBTRACT)

    # Sketch7 → Cut-Extrude6 (cut, through all)
    with BuildSketch(Plane(origin=(0, 0, 0), x_dir=(-1, 0, 0), z_dir=(0, 0, -1))):
        with Locations((85.000000067, 80)):
            Circle(SKETCH7_R)
        with Locations((85.000000067, -80)):
            Circle(SKETCH7_R)
        with Locations((-95.000000067, -80)):
            Circle(SKETCH7_R)
        with Locations((-95.000000067, 80)):
            Circle(SKETCH7_R)
    extrude(amount=-CUT_EXTRUDE6_DEPTH, mode=Mode.SUBTRACT)

    # Sketch8 → Cut-Extrude7 (cut, through all)
    with BuildSketch(Plane(origin=(0, 0, 0), x_dir=(-1, 0, 0), z_dir=(0, 0, -1))):
        with Locations((50.000000067, -78)):
            Circle(SKETCH8_R)
        with Locations((72.200000067, -66.6)):
            Circle(SKETCH8_R)
        with Locations((72.200000067, -36)):
            Circle(SKETCH8_R)
        with Locations((50.000000067, -36)):
            Circle(SKETCH8_R)
    extrude(amount=-CUT_EXTRUDE7_DEPTH, mode=Mode.SUBTRACT)

    # Sketch9 → Cut-Extrude8 (cut)
    with BuildSketch(Plane.XY.offset(4)):
        with Locations((-70.500000067, 0)):
            Rectangle(SKETCH9_W, SKETCH9_H)
    extrude(amount=-CUT_EXTRUDE8_DEPTH, mode=Mode.SUBTRACT)

    # Fillet2
    fillet2_edges = [part.edges().sort_by_distance(p)[0] for p in [
        (-58.000000067, -3, 2),
        (-58.000000067, 3, 2),
        (-83.000000067, -3, 2),
        (-83.000000067, 3, 2),
    ]]
    fillet(fillet2_edges, radius=FILLET2_R - 0.0001)  # a hair under: the kernel refuses the full size


solid = part.part
